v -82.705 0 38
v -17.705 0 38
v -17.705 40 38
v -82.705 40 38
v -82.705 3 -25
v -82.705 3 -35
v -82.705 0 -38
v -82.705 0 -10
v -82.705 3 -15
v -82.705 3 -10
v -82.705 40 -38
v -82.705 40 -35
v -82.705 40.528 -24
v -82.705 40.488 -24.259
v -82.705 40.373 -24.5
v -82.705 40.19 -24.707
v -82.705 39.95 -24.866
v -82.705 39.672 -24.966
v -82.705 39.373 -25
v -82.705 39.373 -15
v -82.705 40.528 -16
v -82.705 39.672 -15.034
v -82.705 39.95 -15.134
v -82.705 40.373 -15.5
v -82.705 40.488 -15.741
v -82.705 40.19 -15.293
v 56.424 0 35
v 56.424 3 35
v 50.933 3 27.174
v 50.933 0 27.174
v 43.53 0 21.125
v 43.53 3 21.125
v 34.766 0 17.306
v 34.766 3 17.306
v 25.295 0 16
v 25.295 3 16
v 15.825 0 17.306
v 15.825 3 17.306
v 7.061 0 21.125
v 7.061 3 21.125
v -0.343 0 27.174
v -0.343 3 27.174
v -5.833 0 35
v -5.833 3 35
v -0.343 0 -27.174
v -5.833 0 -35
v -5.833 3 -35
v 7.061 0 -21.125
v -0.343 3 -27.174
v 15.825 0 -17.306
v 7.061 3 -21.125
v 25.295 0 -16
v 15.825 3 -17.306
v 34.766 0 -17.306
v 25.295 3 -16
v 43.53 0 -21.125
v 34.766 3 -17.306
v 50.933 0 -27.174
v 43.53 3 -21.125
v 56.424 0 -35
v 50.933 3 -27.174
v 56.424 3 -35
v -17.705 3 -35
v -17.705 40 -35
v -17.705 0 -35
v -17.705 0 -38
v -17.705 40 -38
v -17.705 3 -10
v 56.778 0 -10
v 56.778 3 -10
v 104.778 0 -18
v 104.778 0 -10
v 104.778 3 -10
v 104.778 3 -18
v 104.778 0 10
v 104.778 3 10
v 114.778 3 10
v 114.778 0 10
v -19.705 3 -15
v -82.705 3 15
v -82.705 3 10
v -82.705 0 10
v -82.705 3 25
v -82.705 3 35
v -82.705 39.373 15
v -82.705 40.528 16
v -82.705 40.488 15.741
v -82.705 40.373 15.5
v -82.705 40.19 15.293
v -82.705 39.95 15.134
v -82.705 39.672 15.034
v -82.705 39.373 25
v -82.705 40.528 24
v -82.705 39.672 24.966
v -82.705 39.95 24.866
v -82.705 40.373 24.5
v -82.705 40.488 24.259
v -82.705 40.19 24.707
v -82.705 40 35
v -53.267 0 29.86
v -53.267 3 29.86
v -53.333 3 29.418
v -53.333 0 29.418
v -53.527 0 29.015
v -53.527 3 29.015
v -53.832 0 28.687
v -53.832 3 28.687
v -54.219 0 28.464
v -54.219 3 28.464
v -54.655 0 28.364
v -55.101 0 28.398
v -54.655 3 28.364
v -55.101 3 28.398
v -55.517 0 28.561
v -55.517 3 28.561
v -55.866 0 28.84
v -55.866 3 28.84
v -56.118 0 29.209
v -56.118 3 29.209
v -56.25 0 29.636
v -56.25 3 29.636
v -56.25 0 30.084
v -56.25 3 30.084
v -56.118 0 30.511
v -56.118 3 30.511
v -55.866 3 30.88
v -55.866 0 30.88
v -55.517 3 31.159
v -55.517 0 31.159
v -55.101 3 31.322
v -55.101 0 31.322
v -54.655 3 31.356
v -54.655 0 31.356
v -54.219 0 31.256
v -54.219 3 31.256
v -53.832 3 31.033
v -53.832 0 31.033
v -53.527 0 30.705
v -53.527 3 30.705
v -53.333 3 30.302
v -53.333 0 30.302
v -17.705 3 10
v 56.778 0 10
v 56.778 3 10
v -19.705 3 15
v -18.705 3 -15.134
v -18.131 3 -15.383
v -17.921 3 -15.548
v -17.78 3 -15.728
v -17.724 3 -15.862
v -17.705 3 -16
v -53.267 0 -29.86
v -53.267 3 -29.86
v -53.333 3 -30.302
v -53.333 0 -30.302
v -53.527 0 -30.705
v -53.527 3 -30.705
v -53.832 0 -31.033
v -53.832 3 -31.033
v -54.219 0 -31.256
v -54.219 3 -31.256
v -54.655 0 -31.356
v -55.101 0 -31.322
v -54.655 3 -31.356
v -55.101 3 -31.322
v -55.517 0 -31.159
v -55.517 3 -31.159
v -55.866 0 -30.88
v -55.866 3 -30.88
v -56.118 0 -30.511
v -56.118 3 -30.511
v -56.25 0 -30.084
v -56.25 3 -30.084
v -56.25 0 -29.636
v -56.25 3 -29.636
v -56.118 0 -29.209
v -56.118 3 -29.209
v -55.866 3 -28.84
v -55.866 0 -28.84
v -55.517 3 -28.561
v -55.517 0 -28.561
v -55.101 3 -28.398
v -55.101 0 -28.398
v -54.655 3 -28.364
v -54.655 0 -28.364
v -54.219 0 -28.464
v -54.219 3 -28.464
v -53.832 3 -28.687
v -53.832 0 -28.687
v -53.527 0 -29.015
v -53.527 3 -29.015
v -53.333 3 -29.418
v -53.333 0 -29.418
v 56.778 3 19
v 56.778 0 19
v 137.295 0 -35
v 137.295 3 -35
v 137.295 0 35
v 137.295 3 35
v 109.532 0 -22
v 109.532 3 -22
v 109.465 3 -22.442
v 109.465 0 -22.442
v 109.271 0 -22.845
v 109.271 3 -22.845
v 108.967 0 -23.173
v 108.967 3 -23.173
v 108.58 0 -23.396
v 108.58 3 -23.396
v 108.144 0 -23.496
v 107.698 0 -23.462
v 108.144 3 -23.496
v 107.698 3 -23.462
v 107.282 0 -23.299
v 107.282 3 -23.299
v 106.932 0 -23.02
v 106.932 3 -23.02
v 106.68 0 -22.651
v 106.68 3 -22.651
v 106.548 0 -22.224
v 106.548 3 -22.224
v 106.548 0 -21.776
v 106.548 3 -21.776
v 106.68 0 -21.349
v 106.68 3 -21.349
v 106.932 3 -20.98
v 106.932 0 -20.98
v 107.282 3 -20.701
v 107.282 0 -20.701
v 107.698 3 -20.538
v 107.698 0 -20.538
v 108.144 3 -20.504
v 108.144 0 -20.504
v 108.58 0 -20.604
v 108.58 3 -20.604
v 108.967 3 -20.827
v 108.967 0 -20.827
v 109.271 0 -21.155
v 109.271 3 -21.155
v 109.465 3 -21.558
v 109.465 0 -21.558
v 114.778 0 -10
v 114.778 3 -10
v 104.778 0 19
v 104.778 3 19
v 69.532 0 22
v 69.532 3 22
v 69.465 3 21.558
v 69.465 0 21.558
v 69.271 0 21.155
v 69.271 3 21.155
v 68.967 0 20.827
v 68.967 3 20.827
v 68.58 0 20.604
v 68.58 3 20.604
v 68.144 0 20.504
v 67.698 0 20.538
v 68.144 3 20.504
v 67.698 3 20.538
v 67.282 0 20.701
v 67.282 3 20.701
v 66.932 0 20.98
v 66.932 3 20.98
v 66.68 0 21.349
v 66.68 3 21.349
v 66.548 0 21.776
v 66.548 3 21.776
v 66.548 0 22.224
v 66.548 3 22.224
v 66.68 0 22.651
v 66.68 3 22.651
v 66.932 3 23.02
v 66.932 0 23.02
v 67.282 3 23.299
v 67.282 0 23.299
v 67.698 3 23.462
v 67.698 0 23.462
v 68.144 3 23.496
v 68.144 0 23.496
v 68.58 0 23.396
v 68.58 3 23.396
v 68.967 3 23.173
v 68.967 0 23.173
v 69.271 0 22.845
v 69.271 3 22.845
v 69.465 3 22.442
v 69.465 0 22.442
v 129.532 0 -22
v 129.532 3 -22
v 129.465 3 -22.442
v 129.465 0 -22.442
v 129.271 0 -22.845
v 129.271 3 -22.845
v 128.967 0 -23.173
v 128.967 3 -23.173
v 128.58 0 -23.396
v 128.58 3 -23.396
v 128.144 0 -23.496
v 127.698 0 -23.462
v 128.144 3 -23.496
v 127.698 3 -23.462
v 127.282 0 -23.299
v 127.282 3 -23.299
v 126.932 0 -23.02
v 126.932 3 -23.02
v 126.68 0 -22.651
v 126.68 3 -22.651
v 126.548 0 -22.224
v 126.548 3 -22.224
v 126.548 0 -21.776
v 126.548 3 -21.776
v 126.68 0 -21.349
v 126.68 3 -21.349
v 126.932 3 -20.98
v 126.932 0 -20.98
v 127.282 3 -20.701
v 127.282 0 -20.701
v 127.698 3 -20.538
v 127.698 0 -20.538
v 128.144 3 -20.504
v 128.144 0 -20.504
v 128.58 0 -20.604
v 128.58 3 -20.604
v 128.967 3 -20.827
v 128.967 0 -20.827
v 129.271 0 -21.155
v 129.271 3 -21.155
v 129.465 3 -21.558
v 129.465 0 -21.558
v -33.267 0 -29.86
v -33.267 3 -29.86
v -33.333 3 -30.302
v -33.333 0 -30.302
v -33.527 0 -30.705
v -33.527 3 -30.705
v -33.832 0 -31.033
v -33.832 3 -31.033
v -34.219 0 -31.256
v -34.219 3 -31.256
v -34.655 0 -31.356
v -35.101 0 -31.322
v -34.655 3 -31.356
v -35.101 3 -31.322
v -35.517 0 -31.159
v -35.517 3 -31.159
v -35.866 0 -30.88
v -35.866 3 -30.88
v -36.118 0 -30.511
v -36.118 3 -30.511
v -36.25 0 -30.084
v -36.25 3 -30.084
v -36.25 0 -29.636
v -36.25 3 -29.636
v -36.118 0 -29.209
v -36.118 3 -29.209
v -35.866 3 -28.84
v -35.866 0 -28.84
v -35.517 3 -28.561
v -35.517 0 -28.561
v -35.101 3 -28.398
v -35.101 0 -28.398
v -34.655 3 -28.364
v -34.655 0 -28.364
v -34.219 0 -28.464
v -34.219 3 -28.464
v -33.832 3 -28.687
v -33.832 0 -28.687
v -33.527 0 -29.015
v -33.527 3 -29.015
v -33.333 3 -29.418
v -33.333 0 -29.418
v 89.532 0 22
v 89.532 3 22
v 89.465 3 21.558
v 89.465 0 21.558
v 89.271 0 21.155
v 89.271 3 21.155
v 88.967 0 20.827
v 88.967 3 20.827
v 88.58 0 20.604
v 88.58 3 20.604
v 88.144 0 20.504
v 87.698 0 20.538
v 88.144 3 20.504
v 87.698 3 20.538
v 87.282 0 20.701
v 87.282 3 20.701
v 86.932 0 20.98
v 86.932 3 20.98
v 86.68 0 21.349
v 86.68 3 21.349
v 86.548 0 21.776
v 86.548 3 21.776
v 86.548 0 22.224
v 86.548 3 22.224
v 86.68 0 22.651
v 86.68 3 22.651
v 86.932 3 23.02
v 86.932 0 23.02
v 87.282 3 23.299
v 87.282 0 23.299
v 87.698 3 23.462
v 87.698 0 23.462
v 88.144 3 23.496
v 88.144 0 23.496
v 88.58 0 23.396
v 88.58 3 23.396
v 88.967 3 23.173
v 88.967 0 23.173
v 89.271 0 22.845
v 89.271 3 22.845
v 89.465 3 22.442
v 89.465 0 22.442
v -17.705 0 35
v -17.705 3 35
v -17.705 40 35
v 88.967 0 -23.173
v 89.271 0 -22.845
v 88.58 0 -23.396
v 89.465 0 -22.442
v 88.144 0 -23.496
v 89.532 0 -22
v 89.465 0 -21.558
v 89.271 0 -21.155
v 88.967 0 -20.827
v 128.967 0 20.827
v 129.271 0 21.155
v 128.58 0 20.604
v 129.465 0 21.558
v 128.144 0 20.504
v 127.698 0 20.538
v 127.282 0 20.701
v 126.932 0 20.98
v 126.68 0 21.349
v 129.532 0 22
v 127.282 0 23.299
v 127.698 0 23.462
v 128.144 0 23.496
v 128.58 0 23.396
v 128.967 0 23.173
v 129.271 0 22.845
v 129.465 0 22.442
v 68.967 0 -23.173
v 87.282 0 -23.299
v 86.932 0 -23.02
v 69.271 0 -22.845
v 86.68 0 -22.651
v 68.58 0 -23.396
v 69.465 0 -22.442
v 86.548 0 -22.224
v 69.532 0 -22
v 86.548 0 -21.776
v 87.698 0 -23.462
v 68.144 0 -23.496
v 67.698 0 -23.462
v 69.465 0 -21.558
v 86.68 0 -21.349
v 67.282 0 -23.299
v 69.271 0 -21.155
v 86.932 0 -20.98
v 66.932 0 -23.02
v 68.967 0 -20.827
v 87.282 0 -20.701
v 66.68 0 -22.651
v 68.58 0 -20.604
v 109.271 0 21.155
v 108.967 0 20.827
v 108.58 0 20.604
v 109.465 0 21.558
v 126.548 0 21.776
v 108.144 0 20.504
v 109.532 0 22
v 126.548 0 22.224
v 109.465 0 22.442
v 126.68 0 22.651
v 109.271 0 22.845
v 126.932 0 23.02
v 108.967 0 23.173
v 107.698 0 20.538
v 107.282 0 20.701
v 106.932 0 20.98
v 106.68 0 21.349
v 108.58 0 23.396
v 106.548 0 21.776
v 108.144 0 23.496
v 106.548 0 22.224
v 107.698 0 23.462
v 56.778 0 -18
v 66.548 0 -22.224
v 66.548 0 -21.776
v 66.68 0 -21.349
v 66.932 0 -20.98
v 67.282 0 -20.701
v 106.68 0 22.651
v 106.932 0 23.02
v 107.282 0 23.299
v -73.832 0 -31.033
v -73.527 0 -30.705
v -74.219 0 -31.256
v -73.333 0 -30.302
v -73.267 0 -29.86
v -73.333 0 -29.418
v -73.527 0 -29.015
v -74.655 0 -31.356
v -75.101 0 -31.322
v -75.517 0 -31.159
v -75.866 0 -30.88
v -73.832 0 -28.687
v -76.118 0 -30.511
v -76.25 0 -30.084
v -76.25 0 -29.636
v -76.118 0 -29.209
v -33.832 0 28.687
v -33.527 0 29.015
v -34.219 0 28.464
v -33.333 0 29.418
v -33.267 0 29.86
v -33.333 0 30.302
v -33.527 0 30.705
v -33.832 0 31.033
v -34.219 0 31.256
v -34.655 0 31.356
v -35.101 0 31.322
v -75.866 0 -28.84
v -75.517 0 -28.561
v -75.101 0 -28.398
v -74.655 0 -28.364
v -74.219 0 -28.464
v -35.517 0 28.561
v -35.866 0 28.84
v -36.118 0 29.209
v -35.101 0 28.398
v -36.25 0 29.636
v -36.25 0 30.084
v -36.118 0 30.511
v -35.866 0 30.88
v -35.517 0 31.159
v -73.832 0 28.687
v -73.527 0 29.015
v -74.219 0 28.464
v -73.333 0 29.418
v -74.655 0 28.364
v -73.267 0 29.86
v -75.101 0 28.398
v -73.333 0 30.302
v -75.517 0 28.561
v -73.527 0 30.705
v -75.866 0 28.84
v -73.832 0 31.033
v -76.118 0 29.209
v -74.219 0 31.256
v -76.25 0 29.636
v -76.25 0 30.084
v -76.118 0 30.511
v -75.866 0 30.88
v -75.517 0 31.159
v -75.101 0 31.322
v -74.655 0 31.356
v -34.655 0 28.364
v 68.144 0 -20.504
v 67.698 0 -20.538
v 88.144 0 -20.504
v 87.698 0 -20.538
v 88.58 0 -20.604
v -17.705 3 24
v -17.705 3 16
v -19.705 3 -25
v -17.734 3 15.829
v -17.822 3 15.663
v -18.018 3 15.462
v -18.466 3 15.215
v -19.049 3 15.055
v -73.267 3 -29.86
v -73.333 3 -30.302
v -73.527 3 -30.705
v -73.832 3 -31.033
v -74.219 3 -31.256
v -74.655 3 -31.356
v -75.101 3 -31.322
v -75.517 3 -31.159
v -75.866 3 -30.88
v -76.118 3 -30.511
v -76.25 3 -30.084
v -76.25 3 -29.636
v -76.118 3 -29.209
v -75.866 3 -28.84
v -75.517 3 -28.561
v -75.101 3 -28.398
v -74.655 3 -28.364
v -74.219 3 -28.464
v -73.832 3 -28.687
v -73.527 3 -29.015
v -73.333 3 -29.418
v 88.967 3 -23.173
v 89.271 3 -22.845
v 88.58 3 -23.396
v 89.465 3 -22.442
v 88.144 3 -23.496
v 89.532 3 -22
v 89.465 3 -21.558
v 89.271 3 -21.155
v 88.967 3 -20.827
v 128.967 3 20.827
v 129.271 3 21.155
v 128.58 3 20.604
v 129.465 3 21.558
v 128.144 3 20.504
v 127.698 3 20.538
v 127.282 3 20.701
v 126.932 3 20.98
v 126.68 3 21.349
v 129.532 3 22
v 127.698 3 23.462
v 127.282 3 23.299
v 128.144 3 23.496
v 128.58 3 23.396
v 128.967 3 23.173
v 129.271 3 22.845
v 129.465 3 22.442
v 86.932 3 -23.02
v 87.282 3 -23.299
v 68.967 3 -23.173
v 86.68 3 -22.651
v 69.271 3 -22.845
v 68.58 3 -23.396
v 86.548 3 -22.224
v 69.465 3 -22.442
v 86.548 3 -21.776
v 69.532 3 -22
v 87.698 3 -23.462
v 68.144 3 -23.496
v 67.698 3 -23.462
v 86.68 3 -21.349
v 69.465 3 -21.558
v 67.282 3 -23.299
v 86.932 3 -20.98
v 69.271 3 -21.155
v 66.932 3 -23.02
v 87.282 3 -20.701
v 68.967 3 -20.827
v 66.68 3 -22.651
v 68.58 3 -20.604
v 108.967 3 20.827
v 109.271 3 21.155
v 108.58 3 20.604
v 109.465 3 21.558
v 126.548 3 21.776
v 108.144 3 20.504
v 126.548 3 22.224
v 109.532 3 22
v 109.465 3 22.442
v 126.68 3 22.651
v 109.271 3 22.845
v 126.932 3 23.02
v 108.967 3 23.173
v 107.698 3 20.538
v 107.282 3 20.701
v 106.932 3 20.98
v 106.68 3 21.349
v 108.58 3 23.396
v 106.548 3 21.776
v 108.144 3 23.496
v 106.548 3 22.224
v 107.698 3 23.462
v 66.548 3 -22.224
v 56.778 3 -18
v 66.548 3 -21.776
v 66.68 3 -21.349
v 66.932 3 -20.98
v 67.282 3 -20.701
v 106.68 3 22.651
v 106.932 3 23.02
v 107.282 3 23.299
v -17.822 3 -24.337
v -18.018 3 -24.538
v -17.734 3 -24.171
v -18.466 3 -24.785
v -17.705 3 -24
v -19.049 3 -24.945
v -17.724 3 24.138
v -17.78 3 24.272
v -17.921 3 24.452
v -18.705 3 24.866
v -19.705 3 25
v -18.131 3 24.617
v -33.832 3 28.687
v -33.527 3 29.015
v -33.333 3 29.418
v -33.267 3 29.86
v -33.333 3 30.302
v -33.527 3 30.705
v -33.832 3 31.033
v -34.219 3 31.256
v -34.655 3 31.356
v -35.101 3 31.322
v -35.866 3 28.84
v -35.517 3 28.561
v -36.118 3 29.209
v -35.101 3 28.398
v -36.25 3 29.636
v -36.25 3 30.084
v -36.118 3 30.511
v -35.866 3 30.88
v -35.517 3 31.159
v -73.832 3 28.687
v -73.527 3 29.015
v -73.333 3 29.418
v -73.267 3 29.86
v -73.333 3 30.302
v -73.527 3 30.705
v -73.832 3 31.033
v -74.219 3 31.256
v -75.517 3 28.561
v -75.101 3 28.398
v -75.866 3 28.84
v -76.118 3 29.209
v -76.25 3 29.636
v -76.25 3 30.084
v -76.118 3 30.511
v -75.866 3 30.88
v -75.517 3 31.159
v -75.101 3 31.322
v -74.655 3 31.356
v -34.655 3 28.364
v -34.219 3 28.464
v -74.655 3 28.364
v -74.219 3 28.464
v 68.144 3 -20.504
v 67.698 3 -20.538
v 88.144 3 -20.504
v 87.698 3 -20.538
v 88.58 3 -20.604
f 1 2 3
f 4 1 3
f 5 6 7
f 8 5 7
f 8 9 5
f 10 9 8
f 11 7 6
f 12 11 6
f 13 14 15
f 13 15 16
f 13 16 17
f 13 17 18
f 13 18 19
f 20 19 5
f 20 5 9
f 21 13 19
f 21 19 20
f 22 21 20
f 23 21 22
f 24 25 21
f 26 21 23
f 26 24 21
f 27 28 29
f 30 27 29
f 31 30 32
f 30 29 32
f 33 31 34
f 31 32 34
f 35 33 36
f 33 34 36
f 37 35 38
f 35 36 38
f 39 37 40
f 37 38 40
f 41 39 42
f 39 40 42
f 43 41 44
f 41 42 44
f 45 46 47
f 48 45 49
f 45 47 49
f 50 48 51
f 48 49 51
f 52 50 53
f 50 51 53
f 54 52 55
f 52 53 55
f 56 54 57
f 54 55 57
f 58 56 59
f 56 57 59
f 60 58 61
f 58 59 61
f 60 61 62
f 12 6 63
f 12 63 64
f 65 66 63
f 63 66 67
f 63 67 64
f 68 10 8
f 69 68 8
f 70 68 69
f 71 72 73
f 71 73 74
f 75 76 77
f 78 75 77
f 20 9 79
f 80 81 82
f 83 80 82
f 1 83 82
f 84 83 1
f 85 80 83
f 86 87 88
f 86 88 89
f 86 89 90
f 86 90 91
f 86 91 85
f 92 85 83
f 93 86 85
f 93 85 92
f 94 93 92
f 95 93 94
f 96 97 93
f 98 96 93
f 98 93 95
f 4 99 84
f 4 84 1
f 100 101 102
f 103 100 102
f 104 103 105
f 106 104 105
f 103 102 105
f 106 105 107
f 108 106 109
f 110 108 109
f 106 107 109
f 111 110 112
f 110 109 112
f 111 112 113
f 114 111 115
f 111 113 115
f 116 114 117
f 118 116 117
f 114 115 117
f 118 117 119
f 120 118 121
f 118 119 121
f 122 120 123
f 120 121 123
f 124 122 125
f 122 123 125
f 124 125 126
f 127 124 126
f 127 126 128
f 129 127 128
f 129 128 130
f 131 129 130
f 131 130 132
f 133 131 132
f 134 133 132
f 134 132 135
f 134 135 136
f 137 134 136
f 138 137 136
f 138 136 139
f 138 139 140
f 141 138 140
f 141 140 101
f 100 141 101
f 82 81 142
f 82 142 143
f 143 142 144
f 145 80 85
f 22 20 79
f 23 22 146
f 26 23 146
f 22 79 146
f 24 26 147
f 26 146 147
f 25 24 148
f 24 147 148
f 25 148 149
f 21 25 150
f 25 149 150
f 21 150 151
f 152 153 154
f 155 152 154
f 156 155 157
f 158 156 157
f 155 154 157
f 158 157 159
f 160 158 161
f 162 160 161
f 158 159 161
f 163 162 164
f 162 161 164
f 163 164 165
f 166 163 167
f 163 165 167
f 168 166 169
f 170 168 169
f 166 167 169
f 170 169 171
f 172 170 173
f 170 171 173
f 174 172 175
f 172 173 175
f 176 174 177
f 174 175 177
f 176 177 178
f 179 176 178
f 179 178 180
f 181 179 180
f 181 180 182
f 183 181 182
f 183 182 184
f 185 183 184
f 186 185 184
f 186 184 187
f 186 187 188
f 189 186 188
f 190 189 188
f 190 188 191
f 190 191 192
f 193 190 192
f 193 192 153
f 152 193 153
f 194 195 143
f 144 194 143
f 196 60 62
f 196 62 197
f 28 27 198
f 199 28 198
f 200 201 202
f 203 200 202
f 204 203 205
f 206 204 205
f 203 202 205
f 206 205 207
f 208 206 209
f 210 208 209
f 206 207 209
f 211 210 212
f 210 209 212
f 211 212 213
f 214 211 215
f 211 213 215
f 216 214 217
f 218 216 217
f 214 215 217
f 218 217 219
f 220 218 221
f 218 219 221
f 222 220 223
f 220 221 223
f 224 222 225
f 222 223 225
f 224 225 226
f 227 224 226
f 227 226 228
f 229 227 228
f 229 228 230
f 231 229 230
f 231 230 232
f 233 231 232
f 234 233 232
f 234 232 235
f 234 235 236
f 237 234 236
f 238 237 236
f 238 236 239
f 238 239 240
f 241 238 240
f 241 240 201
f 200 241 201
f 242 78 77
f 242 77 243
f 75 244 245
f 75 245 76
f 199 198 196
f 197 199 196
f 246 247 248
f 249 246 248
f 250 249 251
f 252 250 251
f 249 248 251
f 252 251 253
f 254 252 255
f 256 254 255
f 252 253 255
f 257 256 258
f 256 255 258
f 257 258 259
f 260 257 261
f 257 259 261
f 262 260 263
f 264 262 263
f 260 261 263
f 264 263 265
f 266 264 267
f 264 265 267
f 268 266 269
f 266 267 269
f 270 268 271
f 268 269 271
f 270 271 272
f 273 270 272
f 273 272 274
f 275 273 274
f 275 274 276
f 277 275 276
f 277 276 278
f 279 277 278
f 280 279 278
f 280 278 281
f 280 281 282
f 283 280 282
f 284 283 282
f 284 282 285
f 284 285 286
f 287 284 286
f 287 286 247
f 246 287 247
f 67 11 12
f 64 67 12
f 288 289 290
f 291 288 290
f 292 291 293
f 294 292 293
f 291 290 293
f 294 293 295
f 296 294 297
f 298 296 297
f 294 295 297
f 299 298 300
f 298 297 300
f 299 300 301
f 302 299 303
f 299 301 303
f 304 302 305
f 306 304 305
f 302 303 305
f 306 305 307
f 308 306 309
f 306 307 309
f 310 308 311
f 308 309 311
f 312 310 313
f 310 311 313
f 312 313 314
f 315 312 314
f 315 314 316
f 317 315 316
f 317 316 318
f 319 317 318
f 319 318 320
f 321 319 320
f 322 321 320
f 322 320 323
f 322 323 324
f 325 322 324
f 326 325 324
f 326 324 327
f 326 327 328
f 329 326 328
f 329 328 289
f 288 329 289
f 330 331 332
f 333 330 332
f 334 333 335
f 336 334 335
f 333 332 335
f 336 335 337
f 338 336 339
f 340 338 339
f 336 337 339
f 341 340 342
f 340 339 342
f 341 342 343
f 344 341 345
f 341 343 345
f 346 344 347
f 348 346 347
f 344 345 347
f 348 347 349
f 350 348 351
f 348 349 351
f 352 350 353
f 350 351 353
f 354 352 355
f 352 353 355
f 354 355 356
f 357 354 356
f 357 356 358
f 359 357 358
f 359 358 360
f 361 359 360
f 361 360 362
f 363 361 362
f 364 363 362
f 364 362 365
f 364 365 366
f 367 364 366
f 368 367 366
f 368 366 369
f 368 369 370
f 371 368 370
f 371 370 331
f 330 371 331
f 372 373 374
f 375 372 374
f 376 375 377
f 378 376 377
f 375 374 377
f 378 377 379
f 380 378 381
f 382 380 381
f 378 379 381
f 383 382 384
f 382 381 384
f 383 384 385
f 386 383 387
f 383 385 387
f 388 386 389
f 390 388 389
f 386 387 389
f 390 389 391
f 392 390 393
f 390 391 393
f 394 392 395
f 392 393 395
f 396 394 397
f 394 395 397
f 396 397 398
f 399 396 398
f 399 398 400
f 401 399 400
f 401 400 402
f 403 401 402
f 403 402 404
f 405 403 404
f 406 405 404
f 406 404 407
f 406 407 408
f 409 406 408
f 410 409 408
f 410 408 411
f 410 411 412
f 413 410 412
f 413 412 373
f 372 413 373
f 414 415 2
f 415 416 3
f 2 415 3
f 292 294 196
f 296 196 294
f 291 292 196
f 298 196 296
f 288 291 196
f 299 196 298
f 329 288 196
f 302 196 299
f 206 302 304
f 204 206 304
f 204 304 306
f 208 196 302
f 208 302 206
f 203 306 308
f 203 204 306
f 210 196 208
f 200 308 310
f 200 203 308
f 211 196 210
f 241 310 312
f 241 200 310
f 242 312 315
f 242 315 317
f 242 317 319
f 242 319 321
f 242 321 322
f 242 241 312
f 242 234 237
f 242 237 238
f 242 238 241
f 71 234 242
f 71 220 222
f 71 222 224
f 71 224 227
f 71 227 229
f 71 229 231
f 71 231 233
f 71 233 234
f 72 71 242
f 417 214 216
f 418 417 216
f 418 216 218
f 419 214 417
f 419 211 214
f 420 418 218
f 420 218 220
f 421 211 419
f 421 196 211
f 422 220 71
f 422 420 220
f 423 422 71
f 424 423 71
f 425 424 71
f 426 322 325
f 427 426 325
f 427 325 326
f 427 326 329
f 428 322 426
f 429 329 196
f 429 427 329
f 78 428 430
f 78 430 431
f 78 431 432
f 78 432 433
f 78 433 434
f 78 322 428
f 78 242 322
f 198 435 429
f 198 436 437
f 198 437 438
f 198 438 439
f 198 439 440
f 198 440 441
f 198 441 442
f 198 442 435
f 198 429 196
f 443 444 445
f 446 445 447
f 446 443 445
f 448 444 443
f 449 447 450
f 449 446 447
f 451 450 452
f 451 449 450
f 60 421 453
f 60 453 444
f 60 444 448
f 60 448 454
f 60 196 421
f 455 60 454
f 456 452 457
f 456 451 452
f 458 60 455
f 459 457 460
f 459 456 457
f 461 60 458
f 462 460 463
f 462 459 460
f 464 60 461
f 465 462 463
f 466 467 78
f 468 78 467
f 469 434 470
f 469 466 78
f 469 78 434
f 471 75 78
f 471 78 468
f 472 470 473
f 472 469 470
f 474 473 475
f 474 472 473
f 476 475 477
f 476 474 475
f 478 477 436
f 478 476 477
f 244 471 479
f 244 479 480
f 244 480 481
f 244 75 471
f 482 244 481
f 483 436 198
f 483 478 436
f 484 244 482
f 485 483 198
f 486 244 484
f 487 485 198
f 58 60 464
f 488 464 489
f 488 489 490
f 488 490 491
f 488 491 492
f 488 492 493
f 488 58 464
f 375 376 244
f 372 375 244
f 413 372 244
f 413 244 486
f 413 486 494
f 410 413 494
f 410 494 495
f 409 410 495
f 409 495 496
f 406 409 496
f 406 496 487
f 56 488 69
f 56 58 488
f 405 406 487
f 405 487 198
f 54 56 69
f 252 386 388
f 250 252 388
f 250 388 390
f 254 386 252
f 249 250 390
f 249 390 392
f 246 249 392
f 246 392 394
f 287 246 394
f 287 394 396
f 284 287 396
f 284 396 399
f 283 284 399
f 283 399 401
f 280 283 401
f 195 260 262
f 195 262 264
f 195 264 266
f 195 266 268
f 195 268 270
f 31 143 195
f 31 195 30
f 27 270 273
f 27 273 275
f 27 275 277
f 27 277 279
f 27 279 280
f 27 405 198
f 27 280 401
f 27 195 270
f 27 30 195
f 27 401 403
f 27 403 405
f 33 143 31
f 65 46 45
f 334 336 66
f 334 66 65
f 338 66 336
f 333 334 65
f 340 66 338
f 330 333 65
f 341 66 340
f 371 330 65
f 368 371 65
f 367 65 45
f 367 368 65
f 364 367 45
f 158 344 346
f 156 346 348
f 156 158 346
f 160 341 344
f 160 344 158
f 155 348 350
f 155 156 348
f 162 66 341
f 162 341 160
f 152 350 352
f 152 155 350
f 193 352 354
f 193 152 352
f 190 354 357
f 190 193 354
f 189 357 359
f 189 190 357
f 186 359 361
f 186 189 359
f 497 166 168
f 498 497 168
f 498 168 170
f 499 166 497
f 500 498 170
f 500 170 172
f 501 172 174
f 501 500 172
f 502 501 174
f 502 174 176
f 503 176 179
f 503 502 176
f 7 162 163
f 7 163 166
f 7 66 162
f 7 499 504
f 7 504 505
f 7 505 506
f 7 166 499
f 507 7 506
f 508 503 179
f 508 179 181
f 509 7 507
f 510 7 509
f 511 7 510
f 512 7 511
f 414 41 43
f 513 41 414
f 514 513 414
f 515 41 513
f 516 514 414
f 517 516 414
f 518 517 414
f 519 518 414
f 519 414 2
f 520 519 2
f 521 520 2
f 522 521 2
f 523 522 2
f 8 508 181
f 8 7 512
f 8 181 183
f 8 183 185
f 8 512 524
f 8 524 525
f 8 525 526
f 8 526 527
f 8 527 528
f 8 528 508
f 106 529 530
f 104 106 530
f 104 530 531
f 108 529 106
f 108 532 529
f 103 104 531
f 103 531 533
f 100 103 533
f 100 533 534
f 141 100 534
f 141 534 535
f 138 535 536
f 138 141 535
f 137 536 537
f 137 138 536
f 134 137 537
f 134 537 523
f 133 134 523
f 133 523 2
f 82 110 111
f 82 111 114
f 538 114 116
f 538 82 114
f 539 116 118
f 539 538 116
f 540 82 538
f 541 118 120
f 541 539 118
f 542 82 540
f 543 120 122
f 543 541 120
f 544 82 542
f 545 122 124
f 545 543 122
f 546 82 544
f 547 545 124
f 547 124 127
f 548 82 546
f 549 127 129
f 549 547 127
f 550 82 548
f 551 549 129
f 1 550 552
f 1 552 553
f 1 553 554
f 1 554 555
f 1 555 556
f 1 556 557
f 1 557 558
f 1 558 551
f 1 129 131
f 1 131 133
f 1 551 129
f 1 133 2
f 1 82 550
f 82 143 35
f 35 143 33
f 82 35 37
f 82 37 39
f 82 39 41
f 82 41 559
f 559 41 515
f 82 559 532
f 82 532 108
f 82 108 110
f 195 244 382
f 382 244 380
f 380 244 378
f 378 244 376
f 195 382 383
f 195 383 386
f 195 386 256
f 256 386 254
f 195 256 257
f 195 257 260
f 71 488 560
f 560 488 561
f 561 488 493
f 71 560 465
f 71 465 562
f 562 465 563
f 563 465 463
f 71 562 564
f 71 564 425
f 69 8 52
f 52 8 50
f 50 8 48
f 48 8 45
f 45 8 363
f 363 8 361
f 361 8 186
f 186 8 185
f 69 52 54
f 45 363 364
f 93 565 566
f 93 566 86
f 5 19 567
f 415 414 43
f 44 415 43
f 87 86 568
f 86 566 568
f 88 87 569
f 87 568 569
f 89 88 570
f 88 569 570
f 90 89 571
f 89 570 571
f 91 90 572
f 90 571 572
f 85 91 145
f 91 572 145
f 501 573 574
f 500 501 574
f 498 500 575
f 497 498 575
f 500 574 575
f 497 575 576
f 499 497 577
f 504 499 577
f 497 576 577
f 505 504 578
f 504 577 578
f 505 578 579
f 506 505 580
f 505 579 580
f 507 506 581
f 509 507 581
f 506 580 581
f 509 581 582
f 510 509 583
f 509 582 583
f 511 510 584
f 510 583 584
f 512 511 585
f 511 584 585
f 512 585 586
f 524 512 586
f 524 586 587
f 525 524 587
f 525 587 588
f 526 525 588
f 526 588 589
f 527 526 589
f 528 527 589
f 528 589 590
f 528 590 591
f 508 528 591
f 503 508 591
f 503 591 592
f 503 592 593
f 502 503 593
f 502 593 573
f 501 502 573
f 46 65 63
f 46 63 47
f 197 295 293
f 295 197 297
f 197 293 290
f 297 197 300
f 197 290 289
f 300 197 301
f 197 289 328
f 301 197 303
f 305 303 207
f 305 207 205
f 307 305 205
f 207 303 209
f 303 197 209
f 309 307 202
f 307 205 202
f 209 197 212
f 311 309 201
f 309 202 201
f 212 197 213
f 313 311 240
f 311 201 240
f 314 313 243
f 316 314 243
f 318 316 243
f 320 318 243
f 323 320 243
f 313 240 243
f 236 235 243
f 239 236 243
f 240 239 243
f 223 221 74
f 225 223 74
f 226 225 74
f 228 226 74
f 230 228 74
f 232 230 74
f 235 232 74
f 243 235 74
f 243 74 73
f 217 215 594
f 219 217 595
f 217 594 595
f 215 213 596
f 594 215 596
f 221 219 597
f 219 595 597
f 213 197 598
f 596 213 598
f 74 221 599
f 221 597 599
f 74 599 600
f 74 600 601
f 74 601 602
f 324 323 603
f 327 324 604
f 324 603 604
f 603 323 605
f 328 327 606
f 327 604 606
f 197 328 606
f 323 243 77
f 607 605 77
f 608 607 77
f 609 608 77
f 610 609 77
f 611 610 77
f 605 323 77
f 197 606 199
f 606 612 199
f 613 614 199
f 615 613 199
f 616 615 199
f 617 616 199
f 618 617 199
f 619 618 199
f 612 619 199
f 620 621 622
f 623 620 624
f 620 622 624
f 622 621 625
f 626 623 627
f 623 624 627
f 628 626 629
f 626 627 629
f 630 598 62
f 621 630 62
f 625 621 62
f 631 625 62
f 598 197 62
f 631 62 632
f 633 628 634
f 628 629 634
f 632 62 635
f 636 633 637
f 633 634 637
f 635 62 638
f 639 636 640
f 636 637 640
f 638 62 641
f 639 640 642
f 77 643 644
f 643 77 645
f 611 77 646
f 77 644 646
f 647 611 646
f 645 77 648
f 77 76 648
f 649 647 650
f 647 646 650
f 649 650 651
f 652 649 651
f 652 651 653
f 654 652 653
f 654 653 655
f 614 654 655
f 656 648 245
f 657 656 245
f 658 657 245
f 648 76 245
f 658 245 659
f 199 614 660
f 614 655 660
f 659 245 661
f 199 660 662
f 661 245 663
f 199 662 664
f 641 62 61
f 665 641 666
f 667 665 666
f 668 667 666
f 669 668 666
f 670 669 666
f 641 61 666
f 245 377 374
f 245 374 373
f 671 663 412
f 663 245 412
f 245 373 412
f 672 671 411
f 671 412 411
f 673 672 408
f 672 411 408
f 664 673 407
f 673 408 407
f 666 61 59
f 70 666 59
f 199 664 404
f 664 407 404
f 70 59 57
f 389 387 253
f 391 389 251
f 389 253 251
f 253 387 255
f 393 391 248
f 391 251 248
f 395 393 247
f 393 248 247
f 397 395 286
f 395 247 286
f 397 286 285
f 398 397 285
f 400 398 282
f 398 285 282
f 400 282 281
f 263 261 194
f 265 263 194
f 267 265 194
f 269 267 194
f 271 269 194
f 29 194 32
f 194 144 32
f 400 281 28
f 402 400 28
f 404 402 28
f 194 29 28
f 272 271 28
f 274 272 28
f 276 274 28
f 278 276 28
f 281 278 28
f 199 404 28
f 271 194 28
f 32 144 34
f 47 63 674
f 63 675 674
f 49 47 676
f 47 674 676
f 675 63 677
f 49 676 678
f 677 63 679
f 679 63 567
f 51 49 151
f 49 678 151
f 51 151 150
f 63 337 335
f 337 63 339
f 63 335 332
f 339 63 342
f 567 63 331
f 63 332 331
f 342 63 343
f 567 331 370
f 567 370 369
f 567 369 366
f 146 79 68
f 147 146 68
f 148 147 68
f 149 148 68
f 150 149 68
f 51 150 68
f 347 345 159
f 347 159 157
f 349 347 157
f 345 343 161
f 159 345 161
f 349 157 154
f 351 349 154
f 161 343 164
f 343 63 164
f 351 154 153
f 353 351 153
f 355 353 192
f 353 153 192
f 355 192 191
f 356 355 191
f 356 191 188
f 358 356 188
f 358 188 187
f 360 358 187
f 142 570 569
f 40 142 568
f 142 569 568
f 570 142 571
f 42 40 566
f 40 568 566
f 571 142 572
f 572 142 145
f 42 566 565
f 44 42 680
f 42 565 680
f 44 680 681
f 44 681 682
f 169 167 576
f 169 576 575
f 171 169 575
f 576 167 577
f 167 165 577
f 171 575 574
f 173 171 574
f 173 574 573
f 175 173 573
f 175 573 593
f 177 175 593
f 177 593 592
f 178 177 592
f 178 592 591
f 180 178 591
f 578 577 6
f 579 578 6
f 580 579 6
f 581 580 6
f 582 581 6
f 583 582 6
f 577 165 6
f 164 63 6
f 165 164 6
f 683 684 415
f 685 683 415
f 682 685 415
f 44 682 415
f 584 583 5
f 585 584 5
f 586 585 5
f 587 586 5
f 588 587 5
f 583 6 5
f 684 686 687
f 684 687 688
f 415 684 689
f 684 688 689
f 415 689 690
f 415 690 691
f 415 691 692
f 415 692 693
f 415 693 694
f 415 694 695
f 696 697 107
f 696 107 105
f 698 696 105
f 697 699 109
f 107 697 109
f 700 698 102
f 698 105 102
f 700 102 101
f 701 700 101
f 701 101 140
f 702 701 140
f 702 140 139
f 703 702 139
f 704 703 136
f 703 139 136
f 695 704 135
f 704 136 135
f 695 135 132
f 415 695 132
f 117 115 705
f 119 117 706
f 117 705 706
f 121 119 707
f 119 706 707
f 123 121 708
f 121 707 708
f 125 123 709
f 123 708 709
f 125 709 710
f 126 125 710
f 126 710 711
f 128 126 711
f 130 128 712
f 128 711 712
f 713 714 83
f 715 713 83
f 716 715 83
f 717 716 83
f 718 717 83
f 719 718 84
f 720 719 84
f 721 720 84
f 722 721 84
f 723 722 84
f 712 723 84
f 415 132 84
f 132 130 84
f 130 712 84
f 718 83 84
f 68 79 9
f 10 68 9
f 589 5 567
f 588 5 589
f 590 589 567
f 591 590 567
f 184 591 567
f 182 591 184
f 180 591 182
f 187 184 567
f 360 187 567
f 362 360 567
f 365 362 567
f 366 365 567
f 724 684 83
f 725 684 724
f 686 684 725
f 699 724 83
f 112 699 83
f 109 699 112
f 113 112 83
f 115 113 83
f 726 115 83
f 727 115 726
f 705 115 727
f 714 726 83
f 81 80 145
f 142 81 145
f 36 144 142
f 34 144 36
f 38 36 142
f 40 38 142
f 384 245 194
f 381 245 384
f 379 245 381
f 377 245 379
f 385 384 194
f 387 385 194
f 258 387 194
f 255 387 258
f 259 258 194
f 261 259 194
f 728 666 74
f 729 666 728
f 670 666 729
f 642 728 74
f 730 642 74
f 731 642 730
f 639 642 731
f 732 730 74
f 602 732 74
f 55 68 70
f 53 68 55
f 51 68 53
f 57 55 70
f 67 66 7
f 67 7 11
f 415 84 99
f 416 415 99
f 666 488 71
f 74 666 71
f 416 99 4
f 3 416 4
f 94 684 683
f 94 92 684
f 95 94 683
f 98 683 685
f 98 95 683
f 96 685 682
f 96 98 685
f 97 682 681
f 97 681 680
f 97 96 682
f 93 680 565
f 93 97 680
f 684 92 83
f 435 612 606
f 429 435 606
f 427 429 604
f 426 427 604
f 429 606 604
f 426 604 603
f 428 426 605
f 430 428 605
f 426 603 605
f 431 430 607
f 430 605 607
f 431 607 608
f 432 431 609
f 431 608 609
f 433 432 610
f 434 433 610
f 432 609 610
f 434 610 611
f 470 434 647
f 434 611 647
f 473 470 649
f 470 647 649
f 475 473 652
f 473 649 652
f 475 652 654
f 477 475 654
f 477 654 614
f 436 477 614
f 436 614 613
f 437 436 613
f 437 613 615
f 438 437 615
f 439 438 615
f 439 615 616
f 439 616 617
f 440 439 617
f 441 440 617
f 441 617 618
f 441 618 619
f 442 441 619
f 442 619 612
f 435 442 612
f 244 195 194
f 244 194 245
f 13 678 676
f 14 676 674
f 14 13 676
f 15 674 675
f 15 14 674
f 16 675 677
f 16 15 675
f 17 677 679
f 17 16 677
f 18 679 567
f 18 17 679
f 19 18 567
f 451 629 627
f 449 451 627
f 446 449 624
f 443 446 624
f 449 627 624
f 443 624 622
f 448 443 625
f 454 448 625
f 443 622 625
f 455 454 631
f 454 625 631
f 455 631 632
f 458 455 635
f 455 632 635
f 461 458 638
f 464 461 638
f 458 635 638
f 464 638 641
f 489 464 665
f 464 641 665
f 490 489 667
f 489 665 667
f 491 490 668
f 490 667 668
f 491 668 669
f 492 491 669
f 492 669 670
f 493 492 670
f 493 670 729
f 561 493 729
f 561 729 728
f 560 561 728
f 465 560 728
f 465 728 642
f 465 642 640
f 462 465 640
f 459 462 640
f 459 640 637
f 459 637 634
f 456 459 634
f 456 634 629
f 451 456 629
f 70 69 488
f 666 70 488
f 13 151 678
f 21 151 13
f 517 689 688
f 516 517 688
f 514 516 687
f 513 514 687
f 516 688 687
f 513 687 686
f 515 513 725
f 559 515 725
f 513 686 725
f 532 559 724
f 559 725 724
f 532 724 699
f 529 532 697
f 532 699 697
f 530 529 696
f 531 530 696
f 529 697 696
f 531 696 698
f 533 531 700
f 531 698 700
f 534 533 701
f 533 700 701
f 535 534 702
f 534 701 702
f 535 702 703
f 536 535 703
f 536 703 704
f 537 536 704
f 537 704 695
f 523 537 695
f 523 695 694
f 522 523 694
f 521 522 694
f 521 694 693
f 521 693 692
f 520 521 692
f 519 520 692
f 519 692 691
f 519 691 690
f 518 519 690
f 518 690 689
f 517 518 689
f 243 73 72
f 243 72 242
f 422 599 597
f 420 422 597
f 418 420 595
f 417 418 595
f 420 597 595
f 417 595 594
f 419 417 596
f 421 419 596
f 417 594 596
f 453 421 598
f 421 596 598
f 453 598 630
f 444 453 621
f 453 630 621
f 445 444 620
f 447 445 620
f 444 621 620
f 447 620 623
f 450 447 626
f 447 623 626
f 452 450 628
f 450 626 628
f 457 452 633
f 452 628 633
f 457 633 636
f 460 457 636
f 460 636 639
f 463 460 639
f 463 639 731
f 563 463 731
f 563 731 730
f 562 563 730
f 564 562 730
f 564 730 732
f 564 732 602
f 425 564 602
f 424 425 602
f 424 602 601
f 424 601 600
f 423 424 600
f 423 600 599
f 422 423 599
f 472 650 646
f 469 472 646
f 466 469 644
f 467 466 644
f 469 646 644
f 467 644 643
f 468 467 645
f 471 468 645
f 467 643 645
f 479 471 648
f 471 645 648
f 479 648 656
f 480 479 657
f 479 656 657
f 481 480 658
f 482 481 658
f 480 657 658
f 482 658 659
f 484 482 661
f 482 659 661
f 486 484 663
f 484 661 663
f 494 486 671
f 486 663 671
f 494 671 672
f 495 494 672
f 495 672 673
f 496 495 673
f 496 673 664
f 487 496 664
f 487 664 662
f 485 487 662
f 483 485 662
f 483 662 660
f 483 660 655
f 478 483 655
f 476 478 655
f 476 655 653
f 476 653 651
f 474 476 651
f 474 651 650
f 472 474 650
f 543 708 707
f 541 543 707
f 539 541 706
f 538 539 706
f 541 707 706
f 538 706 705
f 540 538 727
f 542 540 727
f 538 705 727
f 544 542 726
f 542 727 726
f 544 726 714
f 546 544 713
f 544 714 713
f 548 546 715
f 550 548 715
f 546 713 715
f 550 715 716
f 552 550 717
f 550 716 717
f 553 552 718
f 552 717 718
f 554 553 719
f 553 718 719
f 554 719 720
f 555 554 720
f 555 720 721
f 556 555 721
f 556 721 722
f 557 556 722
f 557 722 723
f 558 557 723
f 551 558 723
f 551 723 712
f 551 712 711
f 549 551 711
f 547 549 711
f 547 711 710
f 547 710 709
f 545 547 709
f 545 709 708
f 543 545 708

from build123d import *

# Parameters (mm, degrees)
SKETCH_1_W           = 220
SKETCH_1_H           = 70
EXTRUDE_1_DEPTH      = 3
EXTRUDE_2_DEPTH      = 25
EXTRUDE_2_DEPTH_BACK = 25
SKETCH_6_W           = 30
SKETCH_6_H           = 37.527767497
CUT_EXTRUDE_4_DEPTH  = 221
SKETCH_7_R           = 35
CUT_EXTRUDE_5_DEPTH  = 4
SKETCH_8_W           = 3
SKETCH_8_H           = 40
EXTRUDE_3_DEPTH      = 65
SKETCH_9_R           = 1.5
CUT_EXTRUDE_6_DEPTH  = 4
FILLET_5_R           = 1
SKETCH_10_W          = 65
SKETCH_10_H          = 20
CUT_EXTRUDE_7_DEPTH  = 4
SKETCH_11_W          = 132.48262102
SKETCH_11_H          = 20
CUT_EXTRUDE_8_DEPTH  = 25
SKETCH_12_W          = 48
SKETCH_12_H          = 37
CUT_EXTRUDE_9_DEPTH  = 30


with BuildPart() as part:
    # 草图1 → 凸台-拉伸1 (new body)
    with BuildSketch(Plane(origin=(0, 0, 0), x_dir=(1, 0, 0), z_dir=(0, 1, 0))):
        with Locations((27.295373665, 0)):
            Rectangle(SKETCH_1_W, SKETCH_1_H)
    extrude(amount=EXTRUDE_1_DEPTH)

    # 草图2 → 凸台-拉伸2 (add, two sides)
    with BuildSketch(Plane.XY) as extrude_2_sk:
        Polygon((-82.704626335, 40.527767497), (-82.704626335, 3), (-17.704626335, 3), align=None)
    extrude(amount=EXTRUDE_2_DEPTH)
    extrude(extrude_2_sk.sketch, amount=-EXTRUDE_2_DEPTH_BACK)

    # 草图6 → 切除-拉伸4 (cut, through all)
    with BuildSketch(Plane.ZY.offset(82.704626335)):
        with Locations((0, 21.763883748)):
            Rectangle(SKETCH_6_W, SKETCH_6_H)
    extrude(amount=-CUT_EXTRUDE_4_DEPTH, mode=Mode.SUBTRACT)

    # 草图7 → 切除-拉伸5 (cut, through all)
    with BuildSketch(Plane(origin=(0, 3, 0), x_dir=(1, 0, 0), z_dir=(0, 1, 0))):
        with Locations((25.295373665, 51)):
            Circle(SKETCH_7_R)
        with Locations((25.295373665, -51)):
            Circle(SKETCH_7_R)
    extrude(amount=-CUT_EXTRUDE_5_DEPTH, mode=Mode.SUBTRACT)

    # 草图8 → 凸台-拉伸3 (add)
    with BuildSketch(Plane.ZY.offset(82.704626335)):
        with Locations((36.5, 20)):
            Rectangle(SKETCH_8_W, SKETCH_8_H)
        with Locations((-36.5, 20)):
            Rectangle(SKETCH_8_W, SKETCH_8_H)
    extrude(amount=-EXTRUDE_3_DEPTH)

    # 草图9 → 切除-拉伸6 (cut, through all)
    with BuildSketch(Plane(origin=(0, 3, 0), x_dir=(1, 0, 0), z_dir=(0, 1, 0))):
        with Locations((-74.766784803, 29.860059225)):
            Circle(SKETCH_9_R)
        with Locations((-54.766784803, 29.860059225)):
            Circle(SKETCH_9_R)
        with Locations((-34.766784803, 29.860059225)):
            Circle(SKETCH_9_R)
        with Locations((-34.766784803, -29.860059225)):
            Circle(SKETCH_9_R)
        with Locations((-54.766784803, -29.860059225)):
            Circle(SKETCH_9_R)
        with Locations((-74.766784803, -29.860059225)):
            Circle(SKETCH_9_R)
        with Locations((68.031562246, 22)):
            Circle(SKETCH_9_R)
        with Locations((88.031562246, 22)):
            Circle(SKETCH_9_R)
        with Locations((108.031562246, 22)):
            Circle(SKETCH_9_R)
        with Locations((108.031562246, -22)):
            Circle(SKETCH_9_R)
        with Locations((88.031562246, -22)):
            Circle(SKETCH_9_R)
        with Locations((68.031562246, -22)):
            Circle(SKETCH_9_R)
        with Locations((128.031562246, 22)):
            Circle(SKETCH_9_R)
        with Locations((128.031562246, -22)):
            Circle(SKETCH_9_R)
    extrude(amount=-CUT_EXTRUDE_6_DEPTH, mode=Mode.SUBTRACT)

    # 圆角5
    fillet_5_edges = [part.edges().sort_by_distance(p)[0] for p in [
        (-50.204626335, 21.763883749, -25),
        (-50.204626335, 21.763883749, 25),
        (-50.204626335, 21.763883749, -15),
        (-50.204626335, 21.763883749, 15),
    ]]
    fillet(fillet_5_edges, radius=FILLET_5_R)

    # 草图10 → 切除-拉伸7 (cut, through all)
    with BuildSketch(Plane(origin=(0, 3, 0), x_dir=(1, 0, 0), z_dir=(0, 1, 0))):
        with Locations((-50.204626335, 0)):
            Rectangle(SKETCH_10_W, SKETCH_10_H)
    extrude(amount=-CUT_EXTRUDE_7_DEPTH, mode=Mode.SUBTRACT)

    # 草图11 → 切除-拉伸8 (cut)
    with BuildSketch(Plane(origin=(0, 0, 0), x_dir=(1, 0, 0), z_dir=(0, 1, 0))):
        with Locations((48.536684175, 0)):
            Rectangle(SKETCH_11_W, SKETCH_11_H)
    extrude(amount=CUT_EXTRUDE_8_DEPTH, mode=Mode.SUBTRACT)

    # 草图12 → 切除-拉伸9 (cut)
    with BuildSketch(Plane(origin=(0, 0, 0), x_dir=(1, 0, 0), z_dir=(0, 1, 0))):
        with Locations((80.777994685, -0.5)):
            Rectangle(SKETCH_12_W, SKETCH_12_H)
    extrude(amount=CUT_EXTRUDE_9_DEPTH, mode=Mode.SUBTRACT)


solid = part.part
